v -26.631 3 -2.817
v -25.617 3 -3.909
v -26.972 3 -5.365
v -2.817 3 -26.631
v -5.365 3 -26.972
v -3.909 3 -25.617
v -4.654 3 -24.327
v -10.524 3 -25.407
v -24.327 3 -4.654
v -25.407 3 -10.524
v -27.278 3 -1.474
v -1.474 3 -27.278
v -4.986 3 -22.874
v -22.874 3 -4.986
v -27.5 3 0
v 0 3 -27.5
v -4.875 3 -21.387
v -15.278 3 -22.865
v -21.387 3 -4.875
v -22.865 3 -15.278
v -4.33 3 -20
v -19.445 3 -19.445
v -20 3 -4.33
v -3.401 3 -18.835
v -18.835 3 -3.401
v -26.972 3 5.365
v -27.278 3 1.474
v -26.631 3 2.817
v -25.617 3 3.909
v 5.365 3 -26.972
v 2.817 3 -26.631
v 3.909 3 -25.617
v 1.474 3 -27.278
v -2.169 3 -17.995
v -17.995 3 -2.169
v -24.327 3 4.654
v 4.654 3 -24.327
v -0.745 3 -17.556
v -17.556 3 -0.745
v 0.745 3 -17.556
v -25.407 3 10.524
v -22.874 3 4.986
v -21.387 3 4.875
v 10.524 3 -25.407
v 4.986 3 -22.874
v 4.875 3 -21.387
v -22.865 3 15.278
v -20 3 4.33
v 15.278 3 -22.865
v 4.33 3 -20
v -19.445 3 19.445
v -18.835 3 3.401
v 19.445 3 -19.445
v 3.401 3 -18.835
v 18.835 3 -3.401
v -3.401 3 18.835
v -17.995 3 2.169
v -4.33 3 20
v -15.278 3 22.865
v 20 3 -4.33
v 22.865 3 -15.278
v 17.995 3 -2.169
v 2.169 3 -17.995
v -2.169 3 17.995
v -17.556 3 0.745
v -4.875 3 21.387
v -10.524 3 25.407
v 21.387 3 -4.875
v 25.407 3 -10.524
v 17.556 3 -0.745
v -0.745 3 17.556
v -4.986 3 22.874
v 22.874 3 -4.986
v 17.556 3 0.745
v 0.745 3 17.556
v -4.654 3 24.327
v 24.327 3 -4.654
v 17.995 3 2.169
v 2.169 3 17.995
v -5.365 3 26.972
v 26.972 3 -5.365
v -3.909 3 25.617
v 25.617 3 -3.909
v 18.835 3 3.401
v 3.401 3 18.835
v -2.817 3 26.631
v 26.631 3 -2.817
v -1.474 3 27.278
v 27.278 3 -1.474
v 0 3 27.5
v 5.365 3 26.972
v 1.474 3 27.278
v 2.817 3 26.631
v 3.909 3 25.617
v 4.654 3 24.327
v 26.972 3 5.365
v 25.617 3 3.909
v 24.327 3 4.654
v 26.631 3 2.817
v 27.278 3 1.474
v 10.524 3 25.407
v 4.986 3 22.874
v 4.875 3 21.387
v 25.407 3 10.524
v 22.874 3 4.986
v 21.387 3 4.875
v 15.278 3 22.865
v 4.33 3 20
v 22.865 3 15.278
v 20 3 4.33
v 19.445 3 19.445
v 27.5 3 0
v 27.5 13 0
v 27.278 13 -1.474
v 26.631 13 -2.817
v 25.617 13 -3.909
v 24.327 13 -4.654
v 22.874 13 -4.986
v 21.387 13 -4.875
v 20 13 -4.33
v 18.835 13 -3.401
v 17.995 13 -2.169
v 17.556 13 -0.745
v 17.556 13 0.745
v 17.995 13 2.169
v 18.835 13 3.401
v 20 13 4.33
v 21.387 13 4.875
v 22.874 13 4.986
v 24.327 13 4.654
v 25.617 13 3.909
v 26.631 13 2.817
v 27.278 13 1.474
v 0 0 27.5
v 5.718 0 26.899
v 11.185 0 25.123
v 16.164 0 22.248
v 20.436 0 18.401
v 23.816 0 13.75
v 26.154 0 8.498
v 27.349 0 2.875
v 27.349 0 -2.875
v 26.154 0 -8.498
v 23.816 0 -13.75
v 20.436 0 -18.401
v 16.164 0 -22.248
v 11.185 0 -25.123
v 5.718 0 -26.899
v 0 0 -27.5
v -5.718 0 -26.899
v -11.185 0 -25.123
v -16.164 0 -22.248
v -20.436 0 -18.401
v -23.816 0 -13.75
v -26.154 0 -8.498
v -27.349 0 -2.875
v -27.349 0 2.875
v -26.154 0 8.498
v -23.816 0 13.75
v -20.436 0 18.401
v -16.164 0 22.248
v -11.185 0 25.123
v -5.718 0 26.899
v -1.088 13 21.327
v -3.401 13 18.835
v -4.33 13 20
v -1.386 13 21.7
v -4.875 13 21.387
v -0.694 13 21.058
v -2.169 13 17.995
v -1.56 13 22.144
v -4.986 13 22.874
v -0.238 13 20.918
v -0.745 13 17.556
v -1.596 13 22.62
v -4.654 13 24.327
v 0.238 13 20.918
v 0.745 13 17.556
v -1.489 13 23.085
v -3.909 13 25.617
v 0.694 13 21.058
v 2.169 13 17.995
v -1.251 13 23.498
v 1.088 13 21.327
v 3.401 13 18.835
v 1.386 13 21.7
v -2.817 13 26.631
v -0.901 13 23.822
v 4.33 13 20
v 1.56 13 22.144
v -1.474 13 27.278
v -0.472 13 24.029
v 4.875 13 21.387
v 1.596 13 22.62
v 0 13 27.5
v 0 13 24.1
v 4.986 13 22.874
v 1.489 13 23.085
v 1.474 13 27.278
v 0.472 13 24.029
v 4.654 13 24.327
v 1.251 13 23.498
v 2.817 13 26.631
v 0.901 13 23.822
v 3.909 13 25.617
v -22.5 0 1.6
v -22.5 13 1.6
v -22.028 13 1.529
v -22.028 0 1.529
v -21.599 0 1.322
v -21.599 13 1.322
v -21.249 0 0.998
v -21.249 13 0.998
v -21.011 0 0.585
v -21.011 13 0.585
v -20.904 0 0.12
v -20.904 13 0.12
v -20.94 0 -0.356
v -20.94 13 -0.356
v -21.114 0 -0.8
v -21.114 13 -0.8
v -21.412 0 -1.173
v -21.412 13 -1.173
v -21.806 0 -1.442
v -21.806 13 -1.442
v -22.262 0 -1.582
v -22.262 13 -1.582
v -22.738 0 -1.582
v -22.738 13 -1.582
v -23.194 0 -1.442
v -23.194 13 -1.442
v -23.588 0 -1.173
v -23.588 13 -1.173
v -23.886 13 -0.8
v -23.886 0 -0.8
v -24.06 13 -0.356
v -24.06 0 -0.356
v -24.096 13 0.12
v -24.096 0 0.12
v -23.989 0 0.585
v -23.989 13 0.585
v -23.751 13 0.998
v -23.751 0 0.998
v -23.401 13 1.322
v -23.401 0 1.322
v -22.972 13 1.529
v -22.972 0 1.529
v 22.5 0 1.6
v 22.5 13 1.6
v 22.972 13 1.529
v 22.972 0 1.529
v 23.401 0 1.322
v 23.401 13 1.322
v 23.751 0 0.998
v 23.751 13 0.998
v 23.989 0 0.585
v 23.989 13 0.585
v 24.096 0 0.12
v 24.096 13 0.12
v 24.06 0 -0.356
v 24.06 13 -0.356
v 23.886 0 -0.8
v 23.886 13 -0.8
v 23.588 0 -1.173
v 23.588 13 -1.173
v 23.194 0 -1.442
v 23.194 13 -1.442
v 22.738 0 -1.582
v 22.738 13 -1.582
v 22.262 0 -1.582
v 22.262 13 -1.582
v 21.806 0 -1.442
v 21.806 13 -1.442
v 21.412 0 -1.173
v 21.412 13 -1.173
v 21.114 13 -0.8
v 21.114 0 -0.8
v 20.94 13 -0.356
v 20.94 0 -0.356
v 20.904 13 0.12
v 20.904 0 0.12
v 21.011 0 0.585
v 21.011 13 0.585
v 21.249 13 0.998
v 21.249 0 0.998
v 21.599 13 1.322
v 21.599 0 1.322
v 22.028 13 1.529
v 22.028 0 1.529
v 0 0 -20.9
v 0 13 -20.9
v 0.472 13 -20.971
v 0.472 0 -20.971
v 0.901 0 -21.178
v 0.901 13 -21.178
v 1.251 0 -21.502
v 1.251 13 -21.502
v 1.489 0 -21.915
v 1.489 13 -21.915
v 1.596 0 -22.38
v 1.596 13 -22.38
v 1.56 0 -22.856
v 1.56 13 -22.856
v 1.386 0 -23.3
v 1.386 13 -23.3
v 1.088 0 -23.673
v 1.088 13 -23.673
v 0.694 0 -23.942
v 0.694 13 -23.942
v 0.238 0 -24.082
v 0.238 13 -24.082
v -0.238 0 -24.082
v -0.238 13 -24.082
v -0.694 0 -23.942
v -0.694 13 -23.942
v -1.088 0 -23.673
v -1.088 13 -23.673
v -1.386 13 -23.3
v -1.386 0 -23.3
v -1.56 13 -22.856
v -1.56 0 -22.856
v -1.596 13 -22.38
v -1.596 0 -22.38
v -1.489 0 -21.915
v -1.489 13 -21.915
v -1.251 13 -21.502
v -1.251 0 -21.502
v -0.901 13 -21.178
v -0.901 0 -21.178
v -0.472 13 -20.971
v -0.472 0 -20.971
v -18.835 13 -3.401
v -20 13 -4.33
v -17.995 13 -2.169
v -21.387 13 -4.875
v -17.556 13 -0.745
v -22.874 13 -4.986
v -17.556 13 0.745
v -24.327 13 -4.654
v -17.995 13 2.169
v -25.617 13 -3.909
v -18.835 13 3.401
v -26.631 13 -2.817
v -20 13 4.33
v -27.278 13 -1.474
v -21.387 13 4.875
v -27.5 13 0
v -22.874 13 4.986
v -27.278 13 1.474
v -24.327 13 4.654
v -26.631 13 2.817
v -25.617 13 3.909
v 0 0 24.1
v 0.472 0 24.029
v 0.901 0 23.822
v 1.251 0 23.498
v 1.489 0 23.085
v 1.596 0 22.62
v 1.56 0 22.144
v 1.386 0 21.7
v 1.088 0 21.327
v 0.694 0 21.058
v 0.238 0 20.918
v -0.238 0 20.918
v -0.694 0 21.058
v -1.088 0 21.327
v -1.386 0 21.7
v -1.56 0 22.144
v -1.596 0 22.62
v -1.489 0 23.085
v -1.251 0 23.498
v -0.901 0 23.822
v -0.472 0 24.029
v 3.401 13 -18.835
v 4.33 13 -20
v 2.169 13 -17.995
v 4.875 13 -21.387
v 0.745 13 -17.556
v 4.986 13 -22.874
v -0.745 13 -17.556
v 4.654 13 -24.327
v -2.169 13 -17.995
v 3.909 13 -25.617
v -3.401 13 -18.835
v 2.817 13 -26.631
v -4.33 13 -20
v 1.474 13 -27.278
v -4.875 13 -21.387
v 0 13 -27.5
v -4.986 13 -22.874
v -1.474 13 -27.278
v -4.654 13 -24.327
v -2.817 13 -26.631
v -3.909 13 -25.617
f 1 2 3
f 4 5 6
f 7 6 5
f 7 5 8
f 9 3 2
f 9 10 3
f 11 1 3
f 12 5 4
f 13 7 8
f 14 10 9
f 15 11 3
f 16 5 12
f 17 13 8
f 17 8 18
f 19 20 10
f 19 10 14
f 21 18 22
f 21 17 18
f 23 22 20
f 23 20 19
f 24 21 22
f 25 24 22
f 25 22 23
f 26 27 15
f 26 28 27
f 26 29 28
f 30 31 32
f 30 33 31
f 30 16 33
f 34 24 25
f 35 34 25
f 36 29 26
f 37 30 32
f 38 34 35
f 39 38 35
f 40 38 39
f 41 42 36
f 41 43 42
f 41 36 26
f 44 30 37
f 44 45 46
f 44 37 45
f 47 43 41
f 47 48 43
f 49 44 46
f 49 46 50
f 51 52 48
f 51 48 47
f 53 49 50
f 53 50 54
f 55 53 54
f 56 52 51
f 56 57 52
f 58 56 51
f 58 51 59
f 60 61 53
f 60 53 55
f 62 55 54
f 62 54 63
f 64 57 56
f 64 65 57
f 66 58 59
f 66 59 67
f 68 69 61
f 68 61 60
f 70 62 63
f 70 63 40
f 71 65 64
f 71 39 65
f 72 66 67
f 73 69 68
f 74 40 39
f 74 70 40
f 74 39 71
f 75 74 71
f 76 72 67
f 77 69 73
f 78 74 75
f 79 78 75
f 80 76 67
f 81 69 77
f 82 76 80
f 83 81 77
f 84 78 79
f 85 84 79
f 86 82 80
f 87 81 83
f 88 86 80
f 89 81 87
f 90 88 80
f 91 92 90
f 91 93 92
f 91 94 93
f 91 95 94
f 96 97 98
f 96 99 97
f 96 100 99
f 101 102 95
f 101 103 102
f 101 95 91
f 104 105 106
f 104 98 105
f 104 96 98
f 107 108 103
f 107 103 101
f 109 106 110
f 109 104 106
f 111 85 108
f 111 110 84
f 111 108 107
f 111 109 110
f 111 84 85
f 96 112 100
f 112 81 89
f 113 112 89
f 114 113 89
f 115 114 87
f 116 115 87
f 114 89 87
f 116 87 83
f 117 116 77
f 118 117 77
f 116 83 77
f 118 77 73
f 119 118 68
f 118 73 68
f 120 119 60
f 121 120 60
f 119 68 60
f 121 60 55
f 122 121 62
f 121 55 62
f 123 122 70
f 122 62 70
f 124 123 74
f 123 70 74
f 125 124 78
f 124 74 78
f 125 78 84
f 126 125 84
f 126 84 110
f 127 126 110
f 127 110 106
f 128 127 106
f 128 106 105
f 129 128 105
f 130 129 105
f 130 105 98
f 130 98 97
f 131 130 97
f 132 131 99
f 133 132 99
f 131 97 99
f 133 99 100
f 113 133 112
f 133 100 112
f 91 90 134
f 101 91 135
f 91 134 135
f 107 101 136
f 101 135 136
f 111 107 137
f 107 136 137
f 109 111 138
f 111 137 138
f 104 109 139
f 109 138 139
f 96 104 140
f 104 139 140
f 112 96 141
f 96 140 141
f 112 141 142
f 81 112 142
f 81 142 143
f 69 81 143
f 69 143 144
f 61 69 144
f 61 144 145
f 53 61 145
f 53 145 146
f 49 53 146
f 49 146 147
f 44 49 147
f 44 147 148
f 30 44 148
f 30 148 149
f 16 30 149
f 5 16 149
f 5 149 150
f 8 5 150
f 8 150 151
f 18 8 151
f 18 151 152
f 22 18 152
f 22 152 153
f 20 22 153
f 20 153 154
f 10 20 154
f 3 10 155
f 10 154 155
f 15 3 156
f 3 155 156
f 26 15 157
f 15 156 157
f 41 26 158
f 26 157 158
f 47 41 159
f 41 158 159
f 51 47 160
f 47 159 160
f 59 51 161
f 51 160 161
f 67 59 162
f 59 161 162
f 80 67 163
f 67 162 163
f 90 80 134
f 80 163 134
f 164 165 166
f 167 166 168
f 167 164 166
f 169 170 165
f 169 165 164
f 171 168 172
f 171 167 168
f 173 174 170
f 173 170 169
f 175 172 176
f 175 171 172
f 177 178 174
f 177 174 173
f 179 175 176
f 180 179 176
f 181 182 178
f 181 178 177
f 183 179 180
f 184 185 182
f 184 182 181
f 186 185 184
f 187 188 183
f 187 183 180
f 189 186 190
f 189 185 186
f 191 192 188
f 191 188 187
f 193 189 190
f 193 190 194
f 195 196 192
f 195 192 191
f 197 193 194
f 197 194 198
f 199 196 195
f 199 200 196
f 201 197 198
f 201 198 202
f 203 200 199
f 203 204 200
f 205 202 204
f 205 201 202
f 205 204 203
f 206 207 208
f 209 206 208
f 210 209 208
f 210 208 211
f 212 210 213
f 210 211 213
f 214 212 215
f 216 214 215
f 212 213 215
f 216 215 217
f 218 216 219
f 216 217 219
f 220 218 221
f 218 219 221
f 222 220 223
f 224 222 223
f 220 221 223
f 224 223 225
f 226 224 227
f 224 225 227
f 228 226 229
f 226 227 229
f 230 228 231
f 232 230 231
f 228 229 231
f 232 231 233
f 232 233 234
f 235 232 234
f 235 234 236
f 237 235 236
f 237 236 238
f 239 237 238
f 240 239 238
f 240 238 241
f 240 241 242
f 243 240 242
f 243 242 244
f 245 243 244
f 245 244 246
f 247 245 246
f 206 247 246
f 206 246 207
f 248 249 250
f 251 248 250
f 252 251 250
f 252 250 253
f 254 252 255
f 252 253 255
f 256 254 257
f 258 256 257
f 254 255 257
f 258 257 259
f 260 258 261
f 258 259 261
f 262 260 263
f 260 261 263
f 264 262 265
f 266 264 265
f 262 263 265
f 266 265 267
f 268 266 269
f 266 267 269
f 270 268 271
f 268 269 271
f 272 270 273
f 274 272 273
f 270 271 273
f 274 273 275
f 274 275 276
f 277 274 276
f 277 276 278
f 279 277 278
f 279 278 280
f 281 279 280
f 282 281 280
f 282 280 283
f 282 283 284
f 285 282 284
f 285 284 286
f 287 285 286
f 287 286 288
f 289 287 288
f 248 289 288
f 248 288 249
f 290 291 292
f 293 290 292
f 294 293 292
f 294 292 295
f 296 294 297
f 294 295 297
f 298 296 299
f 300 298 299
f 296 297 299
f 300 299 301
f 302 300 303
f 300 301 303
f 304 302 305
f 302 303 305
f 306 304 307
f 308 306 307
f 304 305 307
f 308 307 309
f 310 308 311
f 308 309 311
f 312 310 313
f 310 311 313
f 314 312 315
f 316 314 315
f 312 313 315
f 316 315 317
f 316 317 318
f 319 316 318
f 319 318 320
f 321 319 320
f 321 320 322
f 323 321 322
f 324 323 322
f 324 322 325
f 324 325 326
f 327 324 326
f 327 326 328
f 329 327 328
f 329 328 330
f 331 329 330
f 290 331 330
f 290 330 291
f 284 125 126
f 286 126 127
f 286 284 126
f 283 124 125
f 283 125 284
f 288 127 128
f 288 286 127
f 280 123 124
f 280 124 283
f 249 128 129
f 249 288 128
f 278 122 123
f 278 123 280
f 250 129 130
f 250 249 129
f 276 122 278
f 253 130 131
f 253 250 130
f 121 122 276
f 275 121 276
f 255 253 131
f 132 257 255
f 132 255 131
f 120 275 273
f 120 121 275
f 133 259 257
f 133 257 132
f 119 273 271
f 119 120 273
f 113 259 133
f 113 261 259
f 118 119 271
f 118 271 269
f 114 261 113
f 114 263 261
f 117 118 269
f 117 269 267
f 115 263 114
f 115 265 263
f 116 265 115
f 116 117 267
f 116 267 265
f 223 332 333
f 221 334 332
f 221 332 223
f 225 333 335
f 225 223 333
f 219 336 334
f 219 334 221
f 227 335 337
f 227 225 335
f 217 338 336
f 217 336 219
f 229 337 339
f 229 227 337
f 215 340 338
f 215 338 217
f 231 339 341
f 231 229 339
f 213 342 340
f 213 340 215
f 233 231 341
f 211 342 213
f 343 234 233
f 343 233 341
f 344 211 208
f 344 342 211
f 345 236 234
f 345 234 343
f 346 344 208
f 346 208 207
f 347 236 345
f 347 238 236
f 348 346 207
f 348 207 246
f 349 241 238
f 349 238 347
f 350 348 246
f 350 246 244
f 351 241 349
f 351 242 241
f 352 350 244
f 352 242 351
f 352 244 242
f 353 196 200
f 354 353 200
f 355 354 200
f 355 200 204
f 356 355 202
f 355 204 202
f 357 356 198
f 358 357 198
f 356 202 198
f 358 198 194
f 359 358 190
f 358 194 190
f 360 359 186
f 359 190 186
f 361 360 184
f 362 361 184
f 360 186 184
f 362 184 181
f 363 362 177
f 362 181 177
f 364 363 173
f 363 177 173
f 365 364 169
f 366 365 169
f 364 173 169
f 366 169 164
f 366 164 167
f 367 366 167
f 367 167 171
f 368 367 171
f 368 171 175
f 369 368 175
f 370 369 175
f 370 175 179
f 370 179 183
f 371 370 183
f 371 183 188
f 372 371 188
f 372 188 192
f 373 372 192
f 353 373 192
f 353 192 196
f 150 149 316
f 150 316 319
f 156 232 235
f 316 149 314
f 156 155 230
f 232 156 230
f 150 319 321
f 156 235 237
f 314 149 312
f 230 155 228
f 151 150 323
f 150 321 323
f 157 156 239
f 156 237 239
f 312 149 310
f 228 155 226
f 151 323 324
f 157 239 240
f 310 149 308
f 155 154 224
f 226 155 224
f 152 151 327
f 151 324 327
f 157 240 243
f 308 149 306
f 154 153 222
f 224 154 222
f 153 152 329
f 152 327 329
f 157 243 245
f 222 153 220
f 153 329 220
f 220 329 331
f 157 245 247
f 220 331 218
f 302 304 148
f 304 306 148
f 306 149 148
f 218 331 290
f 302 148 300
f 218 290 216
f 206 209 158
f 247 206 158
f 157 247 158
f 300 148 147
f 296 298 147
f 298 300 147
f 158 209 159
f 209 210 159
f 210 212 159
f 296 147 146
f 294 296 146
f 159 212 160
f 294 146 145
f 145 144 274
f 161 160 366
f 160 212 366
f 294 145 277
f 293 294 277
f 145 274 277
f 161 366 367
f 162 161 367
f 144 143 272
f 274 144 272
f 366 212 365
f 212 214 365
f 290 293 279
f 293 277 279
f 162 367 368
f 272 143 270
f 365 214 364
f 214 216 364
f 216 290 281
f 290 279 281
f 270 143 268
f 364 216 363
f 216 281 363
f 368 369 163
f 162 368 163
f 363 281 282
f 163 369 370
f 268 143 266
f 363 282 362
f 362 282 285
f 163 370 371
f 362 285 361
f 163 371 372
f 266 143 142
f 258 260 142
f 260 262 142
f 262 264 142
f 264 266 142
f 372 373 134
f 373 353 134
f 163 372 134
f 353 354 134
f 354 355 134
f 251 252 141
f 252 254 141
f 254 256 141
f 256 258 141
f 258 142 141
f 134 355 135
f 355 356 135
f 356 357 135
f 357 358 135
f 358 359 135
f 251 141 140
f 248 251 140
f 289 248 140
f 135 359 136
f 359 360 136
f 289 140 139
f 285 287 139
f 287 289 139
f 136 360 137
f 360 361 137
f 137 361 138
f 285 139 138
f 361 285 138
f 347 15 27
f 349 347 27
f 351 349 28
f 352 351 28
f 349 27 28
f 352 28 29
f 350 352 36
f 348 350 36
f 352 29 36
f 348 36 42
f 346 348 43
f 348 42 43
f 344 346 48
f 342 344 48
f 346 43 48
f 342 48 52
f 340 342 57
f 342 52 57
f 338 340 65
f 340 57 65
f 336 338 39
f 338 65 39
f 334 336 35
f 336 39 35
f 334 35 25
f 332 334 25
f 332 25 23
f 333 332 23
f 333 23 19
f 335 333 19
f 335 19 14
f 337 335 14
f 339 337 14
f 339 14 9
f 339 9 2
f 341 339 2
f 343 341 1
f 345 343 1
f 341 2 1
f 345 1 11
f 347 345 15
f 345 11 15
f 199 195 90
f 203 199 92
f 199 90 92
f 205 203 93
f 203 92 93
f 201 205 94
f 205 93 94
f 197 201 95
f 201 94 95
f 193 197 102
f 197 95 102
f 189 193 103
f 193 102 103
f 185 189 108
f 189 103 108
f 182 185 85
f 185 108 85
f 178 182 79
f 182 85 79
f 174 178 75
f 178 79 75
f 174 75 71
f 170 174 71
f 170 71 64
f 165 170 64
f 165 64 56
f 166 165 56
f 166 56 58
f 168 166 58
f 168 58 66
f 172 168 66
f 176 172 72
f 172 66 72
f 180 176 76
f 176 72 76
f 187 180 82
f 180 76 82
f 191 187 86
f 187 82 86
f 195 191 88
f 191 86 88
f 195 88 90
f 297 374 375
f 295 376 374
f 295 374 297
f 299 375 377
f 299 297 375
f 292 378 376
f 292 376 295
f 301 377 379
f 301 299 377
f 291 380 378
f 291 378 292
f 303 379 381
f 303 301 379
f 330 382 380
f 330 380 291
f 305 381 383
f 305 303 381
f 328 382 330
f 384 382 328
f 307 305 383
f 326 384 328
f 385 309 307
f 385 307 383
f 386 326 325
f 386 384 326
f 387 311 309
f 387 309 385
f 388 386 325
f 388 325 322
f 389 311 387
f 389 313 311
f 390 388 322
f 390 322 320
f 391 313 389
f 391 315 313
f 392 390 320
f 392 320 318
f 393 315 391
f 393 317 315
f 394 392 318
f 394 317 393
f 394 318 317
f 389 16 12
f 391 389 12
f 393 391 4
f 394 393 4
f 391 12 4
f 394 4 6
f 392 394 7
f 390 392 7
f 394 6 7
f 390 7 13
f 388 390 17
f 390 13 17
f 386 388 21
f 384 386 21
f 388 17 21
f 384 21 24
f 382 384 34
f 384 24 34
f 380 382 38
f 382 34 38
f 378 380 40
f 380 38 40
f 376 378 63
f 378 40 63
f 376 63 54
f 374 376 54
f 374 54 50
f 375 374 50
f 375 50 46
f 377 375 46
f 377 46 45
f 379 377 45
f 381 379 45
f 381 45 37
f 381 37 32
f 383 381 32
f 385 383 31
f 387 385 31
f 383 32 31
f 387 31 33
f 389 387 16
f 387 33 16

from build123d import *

# Parameters (mm, degrees)
SKETCH1_R           = 27.5
BOSS_EXTRUDE1_DEPTH = 3
SKETCH3_R           = 5
BOSS_EXTRUDE2_DEPTH = 10
SKETCH4_R           = 1.6
CUT_EXTRUDE1_DEPTH  = 42.006097108


with BuildPart() as part:
    # Sketch1 → Boss-Extrude1 (new body)
    with BuildSketch(Plane(origin=(0, 0, 0), x_dir=(1, 0, 0), z_dir=(0, 1, 0))):
        with Locations(Location((0, 0, 0), (0, 0, 270))):
            Circle(SKETCH1_R)
    extrude(amount=BOSS_EXTRUDE1_DEPTH)

    # Sketch3 → Boss-Extrude2 (add)
    with BuildSketch(Plane(origin=(0, 3, 0), x_dir=(1, 0, 0), z_dir=(0, 1, 0))):
        with Locations(Location((0, 22.5, 0), (0, 0, 89.999599385))):
            Circle(SKETCH3_R)
        with Locations(Location((22.5, 0, 0), (0, 0, 359.999599385))):
            Circle(SKETCH3_R)
        with Locations(Location((0, -22.5, 0), (0, 0, 269.999599385))):
            Circle(SKETCH3_R)
        with Locations(Location((-22.5, 0, 0), (0, 0, 179.999599385))):
            Circle(SKETCH3_R)
    extrude(amount=BOSS_EXTRUDE2_DEPTH)

    # Sketch4 → Cut-Extrude1 (cut, through all)
    with BuildSketch(Plane(origin=(0, 13, 0), x_dir=(1, 0, 0), z_dir=(0, 1, 0))):
        with Locations(Location((0, 22.5, 0), (0, 0, 270))):
            Circle(SKETCH4_R)
        with Locations(Location((22.5, 0, 0), (0, 0, 270))):
            Circle(SKETCH4_R)
        with Locations(Location((0, -22.5, 0), (0, 0, 270))):
            Circle(SKETCH4_R)
        with Locations(Location((-22.5, 0, 0), (0, 0, 270))):
            Circle(SKETCH4_R)
    extrude(amount=-CUT_EXTRUDE1_DEPTH, mode=Mode.SUBTRACT)


solid = part.part
